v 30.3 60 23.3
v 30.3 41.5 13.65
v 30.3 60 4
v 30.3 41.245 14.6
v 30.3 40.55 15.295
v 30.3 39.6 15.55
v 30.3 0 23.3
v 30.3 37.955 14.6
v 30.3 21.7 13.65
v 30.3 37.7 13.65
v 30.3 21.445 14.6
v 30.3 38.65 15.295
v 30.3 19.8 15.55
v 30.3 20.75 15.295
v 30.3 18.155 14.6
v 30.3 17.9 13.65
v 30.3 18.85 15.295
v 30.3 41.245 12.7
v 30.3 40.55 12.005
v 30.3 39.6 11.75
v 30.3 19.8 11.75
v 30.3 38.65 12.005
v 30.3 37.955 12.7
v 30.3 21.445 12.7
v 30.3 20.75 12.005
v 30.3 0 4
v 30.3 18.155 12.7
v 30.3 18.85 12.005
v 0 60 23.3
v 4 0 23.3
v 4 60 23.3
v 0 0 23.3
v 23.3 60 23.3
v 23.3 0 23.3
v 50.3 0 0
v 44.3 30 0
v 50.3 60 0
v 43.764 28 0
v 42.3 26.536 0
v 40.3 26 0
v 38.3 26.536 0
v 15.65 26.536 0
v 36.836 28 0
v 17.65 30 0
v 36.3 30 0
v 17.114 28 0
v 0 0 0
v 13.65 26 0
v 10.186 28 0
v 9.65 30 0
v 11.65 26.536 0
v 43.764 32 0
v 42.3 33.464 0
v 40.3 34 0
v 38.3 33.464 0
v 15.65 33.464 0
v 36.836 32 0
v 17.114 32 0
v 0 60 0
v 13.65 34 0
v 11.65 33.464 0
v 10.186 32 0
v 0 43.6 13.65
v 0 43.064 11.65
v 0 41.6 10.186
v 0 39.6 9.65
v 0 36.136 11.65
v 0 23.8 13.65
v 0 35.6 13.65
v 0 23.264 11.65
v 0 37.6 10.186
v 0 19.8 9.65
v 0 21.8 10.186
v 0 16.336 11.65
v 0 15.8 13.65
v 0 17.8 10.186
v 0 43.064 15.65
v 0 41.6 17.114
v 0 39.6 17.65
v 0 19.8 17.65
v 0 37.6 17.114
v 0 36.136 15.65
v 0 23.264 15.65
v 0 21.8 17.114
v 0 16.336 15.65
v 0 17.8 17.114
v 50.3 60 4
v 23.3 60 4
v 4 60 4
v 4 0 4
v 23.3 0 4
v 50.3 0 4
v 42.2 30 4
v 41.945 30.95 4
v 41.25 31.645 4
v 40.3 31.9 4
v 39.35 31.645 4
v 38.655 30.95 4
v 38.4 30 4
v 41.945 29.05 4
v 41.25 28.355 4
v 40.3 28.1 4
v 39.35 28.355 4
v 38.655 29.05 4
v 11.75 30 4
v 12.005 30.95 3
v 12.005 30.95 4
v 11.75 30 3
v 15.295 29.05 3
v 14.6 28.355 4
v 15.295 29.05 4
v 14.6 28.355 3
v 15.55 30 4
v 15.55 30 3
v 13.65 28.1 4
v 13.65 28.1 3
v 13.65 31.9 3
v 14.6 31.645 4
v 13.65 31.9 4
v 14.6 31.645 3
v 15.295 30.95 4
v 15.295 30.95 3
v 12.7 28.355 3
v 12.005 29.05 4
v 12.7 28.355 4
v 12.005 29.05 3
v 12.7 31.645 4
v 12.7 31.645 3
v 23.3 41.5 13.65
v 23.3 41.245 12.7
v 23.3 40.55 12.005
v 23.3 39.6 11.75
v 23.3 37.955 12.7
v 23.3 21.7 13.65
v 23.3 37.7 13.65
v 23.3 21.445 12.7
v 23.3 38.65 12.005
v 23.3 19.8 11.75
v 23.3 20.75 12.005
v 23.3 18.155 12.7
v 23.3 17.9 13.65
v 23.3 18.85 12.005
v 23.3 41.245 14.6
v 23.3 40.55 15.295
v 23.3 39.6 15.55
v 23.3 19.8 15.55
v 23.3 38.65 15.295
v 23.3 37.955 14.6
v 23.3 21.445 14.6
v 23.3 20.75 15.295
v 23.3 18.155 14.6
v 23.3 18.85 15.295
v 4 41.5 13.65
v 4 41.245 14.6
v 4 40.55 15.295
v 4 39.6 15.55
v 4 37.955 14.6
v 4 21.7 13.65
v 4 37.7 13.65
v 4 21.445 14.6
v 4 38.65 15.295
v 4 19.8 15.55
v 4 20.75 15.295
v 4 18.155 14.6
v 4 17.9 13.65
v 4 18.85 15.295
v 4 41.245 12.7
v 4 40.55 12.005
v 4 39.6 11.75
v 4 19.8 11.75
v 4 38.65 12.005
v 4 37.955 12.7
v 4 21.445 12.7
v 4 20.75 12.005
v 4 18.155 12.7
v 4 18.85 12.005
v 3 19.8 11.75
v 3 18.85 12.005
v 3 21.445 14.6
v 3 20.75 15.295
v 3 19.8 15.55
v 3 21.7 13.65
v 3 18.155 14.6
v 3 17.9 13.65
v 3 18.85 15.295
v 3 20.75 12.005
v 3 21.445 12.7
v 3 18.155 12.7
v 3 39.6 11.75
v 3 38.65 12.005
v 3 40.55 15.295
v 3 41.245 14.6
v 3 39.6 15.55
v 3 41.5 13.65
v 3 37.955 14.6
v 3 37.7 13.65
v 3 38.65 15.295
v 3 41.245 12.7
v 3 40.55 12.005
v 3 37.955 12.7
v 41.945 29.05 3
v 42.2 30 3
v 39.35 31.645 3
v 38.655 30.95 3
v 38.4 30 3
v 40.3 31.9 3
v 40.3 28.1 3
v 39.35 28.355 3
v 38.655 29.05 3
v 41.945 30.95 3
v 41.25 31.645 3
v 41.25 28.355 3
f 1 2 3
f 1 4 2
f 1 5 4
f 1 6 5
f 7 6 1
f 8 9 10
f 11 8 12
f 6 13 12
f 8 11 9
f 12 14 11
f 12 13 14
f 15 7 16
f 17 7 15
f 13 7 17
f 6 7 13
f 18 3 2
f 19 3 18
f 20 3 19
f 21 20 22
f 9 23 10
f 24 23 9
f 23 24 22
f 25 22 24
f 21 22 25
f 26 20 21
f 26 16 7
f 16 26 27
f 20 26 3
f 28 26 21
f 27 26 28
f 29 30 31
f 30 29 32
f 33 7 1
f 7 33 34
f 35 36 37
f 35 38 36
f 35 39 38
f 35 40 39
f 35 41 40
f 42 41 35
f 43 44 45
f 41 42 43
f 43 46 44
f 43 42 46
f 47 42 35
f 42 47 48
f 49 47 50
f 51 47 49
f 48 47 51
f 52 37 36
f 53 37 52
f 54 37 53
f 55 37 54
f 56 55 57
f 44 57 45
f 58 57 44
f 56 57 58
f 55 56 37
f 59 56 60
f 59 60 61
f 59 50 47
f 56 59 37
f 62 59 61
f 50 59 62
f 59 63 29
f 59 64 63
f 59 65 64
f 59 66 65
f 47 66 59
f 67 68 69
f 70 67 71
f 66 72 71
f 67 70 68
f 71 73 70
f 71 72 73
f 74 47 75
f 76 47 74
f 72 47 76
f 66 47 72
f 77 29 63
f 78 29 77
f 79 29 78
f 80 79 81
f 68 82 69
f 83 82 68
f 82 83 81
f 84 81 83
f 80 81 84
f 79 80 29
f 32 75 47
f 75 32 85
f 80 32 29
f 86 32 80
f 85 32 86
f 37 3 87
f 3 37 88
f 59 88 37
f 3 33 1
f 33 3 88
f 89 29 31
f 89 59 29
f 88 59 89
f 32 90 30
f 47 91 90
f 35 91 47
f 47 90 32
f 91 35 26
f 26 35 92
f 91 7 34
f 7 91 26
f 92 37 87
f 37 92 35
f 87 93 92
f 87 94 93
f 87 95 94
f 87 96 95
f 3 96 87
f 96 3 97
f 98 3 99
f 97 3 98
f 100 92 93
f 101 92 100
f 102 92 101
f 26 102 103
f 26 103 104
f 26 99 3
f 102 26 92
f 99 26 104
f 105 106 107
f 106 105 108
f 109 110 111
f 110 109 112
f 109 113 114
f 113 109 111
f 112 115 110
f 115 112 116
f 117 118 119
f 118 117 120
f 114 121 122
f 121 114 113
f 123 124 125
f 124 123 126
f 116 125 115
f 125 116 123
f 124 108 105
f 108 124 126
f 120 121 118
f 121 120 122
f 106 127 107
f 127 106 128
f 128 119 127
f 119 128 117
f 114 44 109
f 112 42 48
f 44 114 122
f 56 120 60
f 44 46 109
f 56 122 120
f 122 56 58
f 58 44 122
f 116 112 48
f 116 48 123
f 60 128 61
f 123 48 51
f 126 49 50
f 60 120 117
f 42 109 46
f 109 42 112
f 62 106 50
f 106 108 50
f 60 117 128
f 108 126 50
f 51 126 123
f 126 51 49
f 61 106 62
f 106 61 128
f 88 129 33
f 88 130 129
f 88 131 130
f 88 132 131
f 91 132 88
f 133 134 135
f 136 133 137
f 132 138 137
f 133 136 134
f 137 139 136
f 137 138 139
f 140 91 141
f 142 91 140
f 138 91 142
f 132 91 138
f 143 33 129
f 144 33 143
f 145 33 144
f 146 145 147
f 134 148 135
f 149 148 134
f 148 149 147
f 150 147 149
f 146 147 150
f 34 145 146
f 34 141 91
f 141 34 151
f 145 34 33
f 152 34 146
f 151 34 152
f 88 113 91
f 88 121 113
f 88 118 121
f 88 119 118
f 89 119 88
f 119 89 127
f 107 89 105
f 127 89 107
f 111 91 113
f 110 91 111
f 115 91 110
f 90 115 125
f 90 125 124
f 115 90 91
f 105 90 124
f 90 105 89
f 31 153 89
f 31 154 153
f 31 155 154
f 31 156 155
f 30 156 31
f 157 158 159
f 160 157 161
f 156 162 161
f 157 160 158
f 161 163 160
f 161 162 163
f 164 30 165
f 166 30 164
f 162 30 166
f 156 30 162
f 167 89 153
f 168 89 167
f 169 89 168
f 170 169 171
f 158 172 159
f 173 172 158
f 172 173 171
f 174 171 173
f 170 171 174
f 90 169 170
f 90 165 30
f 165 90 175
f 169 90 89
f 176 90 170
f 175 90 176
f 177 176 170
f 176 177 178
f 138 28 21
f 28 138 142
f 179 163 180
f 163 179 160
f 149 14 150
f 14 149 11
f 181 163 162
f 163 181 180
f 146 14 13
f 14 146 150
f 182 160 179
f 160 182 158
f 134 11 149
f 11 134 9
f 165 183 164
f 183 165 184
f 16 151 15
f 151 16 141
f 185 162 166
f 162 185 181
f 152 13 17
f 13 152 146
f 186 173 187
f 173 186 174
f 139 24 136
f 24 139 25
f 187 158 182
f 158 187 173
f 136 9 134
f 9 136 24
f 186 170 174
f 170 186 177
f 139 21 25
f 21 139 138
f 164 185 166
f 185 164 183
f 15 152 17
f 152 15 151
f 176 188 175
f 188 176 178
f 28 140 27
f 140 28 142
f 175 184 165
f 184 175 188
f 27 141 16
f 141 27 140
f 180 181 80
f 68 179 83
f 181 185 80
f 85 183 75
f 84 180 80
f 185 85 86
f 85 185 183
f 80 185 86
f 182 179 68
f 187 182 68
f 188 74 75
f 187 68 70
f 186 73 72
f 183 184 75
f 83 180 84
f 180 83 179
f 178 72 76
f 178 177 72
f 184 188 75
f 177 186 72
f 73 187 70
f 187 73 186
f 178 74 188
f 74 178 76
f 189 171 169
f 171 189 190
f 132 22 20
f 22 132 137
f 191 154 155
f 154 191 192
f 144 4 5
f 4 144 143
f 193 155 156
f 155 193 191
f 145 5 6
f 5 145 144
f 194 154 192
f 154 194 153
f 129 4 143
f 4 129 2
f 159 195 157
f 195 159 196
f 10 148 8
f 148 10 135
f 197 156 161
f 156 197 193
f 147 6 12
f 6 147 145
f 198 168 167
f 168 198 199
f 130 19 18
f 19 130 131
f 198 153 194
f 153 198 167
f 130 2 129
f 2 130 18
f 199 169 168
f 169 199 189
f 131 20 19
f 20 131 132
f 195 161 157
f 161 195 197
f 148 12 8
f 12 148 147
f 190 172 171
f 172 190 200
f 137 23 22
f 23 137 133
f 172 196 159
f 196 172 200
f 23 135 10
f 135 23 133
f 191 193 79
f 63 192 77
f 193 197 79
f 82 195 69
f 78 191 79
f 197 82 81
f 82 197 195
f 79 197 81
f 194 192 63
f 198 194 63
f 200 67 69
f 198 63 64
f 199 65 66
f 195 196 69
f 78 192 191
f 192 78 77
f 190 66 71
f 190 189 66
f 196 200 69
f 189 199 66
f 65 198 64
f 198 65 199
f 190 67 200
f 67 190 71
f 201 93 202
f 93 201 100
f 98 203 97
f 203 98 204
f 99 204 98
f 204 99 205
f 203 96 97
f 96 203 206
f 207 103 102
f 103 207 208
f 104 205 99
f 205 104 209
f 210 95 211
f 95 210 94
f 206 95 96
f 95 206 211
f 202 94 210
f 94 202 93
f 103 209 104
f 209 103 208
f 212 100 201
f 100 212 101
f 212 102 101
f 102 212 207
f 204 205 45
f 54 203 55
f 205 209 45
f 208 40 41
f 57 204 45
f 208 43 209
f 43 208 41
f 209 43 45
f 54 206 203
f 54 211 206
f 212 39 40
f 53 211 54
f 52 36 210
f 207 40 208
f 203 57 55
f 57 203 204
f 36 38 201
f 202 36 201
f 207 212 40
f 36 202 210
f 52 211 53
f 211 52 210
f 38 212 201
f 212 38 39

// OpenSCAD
difference(){
	union() {
		translate(v = [0, 0, 0]) {
			cube(size = [30.3000000000, 60, 23.3000000000]);
		}
		translate(v = [30.3000000000, 0, 0]) {
			cube(size = [20, 60, 4]);
		}
	}
	/* Holes Below*/
	union(){
		translate(v = [0, 0, 0]){
			translate(v = [4, -1, 4]) {
				cube(size = [19.3000000000, 62, 28.3000000000]);
			}
			translate(v = [13.6500000000, 30.0000000000, 0]) {
				rotate(a = -180, v = [1, 0, 0]) {
					union() {
						union() {
							translate(v = [0, 0, -5]) {
								cylinder($fn = 12, h = 5, r = 1.9000000000);
							}
							translate(v = [0, 0, -3]) {
								cylinder($fn = 12, h = 3, r1 = 1.9000000000, r2 = 4);
							}
						}
						cylinder($fn = 12, h = 1, r = 4);
					}
				}
			}
		}
		translate(v = [0, 19.8000000000, 13.6500000000]) {
			rotate(a = -90, v = [0, 1, 0]) {
				union() {
					union() {
						translate(v = [0, 0, -34.3000000000]) {
							cylinder($fn = 12, h = 34.3000000000, r = 1.9000000000);
						}
						translate(v = [0, 0, -3]) {
							cylinder($fn = 12, h = 3, r1 = 1.9000000000, r2 = 4);
						}
					}
					cylinder($fn = 12, h = 1, r = 4);
				}
			}
		}
		translate(v = [0, 39.6000000000, 13.6500000000]) {
			rotate(a = -90, v = [0, 1, 0]) {
				union() {
					union() {
						translate(v = [0, 0, -34.3000000000]) {
							cylinder($fn = 12, h = 34.3000000000, r = 1.9000000000);
						}
						translate(v = [0, 0, -3]) {
							cylinder($fn = 12, h = 3, r1 = 1.9000000000, r2 = 4);
						}
					}
					cylinder($fn = 12, h = 1, r = 4);
				}
			}
		}
		translate(v = [40.3000000000, 30.0000000000, 0]) {
			rotate(a = 180, v = [0, 1, 0]) {
				union() {
					union() {
						translate(v = [0, 0, -5]) {
							cylinder($fn = 12, h = 5, r = 1.9000000000);
						}
						translate(v = [0, 0, -3]) {
							cylinder($fn = 12, h = 3, r1 = 1.9000000000, r2 = 4);
						}
					}
					cylinder($fn = 12, h = 1, r = 4);
				}
			}
		}
	} /* End Holes */ 
}
